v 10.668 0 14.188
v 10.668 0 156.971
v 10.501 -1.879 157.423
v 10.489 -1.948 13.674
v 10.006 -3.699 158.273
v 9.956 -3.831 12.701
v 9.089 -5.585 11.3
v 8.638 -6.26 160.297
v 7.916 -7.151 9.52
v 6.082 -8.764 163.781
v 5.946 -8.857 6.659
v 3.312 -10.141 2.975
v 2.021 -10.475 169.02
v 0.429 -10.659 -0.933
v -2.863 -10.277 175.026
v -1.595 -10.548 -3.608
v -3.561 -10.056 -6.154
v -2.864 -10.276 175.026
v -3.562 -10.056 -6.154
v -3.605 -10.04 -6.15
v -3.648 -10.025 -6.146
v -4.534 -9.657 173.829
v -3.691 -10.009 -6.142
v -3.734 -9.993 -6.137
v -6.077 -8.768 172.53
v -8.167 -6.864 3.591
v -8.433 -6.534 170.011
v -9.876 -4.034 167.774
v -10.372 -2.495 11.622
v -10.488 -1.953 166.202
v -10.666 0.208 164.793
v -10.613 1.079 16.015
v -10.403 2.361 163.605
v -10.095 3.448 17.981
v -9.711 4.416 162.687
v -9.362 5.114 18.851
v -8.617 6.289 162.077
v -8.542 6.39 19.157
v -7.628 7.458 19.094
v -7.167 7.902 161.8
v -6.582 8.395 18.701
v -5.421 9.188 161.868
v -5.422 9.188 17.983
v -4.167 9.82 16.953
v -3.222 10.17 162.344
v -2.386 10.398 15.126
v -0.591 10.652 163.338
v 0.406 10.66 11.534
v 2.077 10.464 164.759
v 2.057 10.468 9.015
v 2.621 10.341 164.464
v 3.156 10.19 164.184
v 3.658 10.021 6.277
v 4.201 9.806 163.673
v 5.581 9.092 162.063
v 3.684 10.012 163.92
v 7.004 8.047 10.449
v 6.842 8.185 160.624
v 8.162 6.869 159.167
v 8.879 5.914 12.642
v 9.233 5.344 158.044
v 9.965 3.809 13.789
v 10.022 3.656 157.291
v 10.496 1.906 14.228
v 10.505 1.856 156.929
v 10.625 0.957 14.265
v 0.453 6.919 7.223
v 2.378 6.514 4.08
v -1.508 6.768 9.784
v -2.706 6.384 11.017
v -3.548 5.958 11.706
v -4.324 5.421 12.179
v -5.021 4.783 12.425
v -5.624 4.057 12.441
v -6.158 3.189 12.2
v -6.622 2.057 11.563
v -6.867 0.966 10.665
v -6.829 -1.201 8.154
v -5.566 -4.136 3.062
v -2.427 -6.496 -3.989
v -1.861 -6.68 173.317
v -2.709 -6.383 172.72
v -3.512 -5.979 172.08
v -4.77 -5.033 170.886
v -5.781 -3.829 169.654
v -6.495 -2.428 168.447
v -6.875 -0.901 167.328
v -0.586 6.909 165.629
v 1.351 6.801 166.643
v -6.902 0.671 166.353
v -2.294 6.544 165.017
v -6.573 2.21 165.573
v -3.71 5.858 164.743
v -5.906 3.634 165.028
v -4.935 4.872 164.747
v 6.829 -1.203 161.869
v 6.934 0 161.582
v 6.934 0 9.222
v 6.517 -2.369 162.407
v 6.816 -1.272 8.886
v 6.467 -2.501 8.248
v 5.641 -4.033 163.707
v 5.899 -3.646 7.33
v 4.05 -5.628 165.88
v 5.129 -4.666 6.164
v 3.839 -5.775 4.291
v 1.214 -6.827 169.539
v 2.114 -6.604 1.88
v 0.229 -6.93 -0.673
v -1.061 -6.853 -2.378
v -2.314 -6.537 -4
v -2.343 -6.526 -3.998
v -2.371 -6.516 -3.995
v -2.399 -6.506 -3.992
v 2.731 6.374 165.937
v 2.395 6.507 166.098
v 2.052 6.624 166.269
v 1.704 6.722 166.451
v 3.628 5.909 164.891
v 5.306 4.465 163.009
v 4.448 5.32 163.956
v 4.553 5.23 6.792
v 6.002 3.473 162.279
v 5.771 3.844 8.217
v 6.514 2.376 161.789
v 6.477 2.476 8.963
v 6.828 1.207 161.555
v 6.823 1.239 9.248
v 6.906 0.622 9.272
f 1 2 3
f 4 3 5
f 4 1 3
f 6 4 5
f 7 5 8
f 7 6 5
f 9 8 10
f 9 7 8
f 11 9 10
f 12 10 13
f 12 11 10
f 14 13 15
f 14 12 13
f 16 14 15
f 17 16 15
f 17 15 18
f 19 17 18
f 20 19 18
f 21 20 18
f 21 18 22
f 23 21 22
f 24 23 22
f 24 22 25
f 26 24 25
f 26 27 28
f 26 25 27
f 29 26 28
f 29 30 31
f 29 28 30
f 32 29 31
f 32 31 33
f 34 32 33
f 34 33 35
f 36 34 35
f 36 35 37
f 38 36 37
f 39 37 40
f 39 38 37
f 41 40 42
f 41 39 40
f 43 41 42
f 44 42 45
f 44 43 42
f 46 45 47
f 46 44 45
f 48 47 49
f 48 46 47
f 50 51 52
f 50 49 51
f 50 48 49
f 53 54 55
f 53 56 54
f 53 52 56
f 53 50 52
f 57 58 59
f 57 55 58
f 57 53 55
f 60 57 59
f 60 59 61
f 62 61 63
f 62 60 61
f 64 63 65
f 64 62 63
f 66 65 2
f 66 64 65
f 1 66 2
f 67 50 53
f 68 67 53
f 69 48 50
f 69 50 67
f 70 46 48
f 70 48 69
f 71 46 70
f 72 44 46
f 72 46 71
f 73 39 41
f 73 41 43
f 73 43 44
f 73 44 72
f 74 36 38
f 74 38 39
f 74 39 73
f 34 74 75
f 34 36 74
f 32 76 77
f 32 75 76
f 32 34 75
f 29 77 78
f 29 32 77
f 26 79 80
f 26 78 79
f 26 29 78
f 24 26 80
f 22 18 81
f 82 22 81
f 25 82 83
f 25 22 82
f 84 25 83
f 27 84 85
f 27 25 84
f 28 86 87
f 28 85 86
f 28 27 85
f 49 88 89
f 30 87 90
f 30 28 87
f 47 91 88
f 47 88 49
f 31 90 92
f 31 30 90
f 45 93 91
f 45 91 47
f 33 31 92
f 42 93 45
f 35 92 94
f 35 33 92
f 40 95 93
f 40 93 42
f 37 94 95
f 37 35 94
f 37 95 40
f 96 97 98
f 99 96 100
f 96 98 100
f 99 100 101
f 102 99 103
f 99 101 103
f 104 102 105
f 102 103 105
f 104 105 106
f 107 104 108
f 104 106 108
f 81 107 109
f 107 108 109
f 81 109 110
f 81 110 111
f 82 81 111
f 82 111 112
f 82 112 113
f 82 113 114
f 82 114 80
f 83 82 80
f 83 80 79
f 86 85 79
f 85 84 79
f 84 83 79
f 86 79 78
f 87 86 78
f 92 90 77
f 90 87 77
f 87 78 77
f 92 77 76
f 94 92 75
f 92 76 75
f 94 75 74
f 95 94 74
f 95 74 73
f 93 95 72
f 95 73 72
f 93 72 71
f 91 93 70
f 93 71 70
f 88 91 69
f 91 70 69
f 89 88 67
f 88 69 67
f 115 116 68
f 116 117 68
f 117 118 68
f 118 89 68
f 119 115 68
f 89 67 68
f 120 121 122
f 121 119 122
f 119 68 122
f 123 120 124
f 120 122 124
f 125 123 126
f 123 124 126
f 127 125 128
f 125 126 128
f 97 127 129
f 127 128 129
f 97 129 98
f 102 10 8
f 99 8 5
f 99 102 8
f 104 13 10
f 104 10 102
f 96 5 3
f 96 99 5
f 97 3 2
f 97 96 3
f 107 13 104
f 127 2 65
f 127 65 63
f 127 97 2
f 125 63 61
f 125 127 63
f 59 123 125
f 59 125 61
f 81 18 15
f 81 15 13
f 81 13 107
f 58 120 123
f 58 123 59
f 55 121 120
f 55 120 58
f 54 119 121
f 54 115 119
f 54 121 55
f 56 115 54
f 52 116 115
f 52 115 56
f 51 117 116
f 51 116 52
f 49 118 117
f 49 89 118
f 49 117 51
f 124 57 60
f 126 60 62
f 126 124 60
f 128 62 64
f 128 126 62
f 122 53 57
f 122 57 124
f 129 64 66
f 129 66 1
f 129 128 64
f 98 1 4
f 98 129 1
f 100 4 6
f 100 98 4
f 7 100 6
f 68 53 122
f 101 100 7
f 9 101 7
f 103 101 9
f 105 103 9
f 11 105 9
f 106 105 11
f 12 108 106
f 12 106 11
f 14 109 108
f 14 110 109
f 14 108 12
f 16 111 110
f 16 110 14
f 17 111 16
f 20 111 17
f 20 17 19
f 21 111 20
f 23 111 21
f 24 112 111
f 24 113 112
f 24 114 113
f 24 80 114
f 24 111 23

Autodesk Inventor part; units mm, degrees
ref_plane "Start Plane" through (0, 0, -6.1539) normal (0, 0, 1) x (1, 0, 0)
ref_plane "End Plane" through (0, 0, 175.0259) normal (0, 0, 1) x (1, 0, 0)
sketch "Sketch" plane through (0, 0, 0) normal (0, 0, 1) x (1, 0, 0)
  circle A0 centre (0, 0) radius 6.9342
  circle A1 centre (0, 0) radius 10.668
  dimension "d0" = 21.336
  dimension "d1" = 3.7338
extrude "Body" add sketch "Sketch" along normal up to surface (181.1798 mm away) from surface at -6.1539
sketch "Sketch3" plane through (0, 0, 0) normal (0, 0, 1) x (1, 0, 0)
  line L0 (0, 0) -> (10, 0)
ref_plane "Work Plane3" through (0, 0, 0) normal (0, -1, 0) x (1, 0, 0)
sketch "Sketch4" plane through (0, 0, 0) normal (0, -1, 0) x (1, 0, 0)
  line L0 (-2, -6.1539) -> (12, -6.1539)
  line L1 (-2, 175.0259) -> (12, 175.0259)
  dimension "d7" = 181.1798
ref_plane "Work Plane4" through (-10.6086, -1.1246, -14.2686) normal (0.7964, 0.0844, -0.5988) x (-0.581, -0.1676, -0.7964)
split "Split1" plane through (-10.6086, -1.1246, -14.2686) removes the side toward (0.7964, 0.0844, -0.5988)
ref_plane "Work Plane5" through (-2.0318, -10.4727, -6.2226) normal (0.096, 0.4946, -0.8638) x (0.9324, -0.3485, -0.096)
split "Split2" plane through (-2.0318, -10.4727, -6.2226) removes the side toward (0.096, 0.4946, -0.8638)
ref_plane "Work Plane6" through (8.2715, -6.7371, -19.1714) normal (-0.6775, 0.5518, -0.4862) x (0.1065, 0.7277, 0.6775)
split "Split3" plane through (8.2715, -6.7371, -19.1714) removes the side toward (-0.6775, 0.5518, -0.4862)
ref_plane "Work Plane7" through (-9.0832, -5.5948, 178.0591) normal (0.5074, 0.3125, 0.8031) x (0.8572, -0.0879, -0.5074)
split "Split4" plane through (-9.0832, -5.5948, 178.0591) removes the side toward (0.5074, 0.3125, 0.8031)
ref_plane "Work Plane8" through (-10.6086, -1.1246, 183.392) normal (0.7745, 0.0821, 0.6272) x (0.6313, -0.0391, -0.7745)
split "Split5" plane through (-10.6086, -1.1246, 183.392) removes the side toward (0.7745, 0.0821, 0.6272)
ref_plane "Work Plane9" through (6.6665, -8.3285, 178.5004) normal (-0.3854, 0.4815, 0.7872) x (0.9169, 0.1038, 0.3854)
split "Split6" plane through (6.6665, -8.3285, 178.5004) removes the side toward (-0.3854, 0.4815, 0.7872)
equation "\"d0\" = G_H"
equation "\"d1\" = G_T"
equation "\"d2\" = G_L"
equation "\"G_H\" = 21.336"
equation "\"G_T\" = 3.7338"
equation "\"G_L\" = 181.17984"
equation "\"G_OFFSET_START\" = 6.15394"
equation "\"G_OFFSET_END\" = 4.88279"
equation "\"d4\" = -G_OFFSET_START"
equation "\"d5\" = G_OFFSET_END + B_L"
equation "\"B_L\" = 170.14311"
properties part number "ANSI - 1/2 x 0.147 - 7.133" material "Steel, Mild"
